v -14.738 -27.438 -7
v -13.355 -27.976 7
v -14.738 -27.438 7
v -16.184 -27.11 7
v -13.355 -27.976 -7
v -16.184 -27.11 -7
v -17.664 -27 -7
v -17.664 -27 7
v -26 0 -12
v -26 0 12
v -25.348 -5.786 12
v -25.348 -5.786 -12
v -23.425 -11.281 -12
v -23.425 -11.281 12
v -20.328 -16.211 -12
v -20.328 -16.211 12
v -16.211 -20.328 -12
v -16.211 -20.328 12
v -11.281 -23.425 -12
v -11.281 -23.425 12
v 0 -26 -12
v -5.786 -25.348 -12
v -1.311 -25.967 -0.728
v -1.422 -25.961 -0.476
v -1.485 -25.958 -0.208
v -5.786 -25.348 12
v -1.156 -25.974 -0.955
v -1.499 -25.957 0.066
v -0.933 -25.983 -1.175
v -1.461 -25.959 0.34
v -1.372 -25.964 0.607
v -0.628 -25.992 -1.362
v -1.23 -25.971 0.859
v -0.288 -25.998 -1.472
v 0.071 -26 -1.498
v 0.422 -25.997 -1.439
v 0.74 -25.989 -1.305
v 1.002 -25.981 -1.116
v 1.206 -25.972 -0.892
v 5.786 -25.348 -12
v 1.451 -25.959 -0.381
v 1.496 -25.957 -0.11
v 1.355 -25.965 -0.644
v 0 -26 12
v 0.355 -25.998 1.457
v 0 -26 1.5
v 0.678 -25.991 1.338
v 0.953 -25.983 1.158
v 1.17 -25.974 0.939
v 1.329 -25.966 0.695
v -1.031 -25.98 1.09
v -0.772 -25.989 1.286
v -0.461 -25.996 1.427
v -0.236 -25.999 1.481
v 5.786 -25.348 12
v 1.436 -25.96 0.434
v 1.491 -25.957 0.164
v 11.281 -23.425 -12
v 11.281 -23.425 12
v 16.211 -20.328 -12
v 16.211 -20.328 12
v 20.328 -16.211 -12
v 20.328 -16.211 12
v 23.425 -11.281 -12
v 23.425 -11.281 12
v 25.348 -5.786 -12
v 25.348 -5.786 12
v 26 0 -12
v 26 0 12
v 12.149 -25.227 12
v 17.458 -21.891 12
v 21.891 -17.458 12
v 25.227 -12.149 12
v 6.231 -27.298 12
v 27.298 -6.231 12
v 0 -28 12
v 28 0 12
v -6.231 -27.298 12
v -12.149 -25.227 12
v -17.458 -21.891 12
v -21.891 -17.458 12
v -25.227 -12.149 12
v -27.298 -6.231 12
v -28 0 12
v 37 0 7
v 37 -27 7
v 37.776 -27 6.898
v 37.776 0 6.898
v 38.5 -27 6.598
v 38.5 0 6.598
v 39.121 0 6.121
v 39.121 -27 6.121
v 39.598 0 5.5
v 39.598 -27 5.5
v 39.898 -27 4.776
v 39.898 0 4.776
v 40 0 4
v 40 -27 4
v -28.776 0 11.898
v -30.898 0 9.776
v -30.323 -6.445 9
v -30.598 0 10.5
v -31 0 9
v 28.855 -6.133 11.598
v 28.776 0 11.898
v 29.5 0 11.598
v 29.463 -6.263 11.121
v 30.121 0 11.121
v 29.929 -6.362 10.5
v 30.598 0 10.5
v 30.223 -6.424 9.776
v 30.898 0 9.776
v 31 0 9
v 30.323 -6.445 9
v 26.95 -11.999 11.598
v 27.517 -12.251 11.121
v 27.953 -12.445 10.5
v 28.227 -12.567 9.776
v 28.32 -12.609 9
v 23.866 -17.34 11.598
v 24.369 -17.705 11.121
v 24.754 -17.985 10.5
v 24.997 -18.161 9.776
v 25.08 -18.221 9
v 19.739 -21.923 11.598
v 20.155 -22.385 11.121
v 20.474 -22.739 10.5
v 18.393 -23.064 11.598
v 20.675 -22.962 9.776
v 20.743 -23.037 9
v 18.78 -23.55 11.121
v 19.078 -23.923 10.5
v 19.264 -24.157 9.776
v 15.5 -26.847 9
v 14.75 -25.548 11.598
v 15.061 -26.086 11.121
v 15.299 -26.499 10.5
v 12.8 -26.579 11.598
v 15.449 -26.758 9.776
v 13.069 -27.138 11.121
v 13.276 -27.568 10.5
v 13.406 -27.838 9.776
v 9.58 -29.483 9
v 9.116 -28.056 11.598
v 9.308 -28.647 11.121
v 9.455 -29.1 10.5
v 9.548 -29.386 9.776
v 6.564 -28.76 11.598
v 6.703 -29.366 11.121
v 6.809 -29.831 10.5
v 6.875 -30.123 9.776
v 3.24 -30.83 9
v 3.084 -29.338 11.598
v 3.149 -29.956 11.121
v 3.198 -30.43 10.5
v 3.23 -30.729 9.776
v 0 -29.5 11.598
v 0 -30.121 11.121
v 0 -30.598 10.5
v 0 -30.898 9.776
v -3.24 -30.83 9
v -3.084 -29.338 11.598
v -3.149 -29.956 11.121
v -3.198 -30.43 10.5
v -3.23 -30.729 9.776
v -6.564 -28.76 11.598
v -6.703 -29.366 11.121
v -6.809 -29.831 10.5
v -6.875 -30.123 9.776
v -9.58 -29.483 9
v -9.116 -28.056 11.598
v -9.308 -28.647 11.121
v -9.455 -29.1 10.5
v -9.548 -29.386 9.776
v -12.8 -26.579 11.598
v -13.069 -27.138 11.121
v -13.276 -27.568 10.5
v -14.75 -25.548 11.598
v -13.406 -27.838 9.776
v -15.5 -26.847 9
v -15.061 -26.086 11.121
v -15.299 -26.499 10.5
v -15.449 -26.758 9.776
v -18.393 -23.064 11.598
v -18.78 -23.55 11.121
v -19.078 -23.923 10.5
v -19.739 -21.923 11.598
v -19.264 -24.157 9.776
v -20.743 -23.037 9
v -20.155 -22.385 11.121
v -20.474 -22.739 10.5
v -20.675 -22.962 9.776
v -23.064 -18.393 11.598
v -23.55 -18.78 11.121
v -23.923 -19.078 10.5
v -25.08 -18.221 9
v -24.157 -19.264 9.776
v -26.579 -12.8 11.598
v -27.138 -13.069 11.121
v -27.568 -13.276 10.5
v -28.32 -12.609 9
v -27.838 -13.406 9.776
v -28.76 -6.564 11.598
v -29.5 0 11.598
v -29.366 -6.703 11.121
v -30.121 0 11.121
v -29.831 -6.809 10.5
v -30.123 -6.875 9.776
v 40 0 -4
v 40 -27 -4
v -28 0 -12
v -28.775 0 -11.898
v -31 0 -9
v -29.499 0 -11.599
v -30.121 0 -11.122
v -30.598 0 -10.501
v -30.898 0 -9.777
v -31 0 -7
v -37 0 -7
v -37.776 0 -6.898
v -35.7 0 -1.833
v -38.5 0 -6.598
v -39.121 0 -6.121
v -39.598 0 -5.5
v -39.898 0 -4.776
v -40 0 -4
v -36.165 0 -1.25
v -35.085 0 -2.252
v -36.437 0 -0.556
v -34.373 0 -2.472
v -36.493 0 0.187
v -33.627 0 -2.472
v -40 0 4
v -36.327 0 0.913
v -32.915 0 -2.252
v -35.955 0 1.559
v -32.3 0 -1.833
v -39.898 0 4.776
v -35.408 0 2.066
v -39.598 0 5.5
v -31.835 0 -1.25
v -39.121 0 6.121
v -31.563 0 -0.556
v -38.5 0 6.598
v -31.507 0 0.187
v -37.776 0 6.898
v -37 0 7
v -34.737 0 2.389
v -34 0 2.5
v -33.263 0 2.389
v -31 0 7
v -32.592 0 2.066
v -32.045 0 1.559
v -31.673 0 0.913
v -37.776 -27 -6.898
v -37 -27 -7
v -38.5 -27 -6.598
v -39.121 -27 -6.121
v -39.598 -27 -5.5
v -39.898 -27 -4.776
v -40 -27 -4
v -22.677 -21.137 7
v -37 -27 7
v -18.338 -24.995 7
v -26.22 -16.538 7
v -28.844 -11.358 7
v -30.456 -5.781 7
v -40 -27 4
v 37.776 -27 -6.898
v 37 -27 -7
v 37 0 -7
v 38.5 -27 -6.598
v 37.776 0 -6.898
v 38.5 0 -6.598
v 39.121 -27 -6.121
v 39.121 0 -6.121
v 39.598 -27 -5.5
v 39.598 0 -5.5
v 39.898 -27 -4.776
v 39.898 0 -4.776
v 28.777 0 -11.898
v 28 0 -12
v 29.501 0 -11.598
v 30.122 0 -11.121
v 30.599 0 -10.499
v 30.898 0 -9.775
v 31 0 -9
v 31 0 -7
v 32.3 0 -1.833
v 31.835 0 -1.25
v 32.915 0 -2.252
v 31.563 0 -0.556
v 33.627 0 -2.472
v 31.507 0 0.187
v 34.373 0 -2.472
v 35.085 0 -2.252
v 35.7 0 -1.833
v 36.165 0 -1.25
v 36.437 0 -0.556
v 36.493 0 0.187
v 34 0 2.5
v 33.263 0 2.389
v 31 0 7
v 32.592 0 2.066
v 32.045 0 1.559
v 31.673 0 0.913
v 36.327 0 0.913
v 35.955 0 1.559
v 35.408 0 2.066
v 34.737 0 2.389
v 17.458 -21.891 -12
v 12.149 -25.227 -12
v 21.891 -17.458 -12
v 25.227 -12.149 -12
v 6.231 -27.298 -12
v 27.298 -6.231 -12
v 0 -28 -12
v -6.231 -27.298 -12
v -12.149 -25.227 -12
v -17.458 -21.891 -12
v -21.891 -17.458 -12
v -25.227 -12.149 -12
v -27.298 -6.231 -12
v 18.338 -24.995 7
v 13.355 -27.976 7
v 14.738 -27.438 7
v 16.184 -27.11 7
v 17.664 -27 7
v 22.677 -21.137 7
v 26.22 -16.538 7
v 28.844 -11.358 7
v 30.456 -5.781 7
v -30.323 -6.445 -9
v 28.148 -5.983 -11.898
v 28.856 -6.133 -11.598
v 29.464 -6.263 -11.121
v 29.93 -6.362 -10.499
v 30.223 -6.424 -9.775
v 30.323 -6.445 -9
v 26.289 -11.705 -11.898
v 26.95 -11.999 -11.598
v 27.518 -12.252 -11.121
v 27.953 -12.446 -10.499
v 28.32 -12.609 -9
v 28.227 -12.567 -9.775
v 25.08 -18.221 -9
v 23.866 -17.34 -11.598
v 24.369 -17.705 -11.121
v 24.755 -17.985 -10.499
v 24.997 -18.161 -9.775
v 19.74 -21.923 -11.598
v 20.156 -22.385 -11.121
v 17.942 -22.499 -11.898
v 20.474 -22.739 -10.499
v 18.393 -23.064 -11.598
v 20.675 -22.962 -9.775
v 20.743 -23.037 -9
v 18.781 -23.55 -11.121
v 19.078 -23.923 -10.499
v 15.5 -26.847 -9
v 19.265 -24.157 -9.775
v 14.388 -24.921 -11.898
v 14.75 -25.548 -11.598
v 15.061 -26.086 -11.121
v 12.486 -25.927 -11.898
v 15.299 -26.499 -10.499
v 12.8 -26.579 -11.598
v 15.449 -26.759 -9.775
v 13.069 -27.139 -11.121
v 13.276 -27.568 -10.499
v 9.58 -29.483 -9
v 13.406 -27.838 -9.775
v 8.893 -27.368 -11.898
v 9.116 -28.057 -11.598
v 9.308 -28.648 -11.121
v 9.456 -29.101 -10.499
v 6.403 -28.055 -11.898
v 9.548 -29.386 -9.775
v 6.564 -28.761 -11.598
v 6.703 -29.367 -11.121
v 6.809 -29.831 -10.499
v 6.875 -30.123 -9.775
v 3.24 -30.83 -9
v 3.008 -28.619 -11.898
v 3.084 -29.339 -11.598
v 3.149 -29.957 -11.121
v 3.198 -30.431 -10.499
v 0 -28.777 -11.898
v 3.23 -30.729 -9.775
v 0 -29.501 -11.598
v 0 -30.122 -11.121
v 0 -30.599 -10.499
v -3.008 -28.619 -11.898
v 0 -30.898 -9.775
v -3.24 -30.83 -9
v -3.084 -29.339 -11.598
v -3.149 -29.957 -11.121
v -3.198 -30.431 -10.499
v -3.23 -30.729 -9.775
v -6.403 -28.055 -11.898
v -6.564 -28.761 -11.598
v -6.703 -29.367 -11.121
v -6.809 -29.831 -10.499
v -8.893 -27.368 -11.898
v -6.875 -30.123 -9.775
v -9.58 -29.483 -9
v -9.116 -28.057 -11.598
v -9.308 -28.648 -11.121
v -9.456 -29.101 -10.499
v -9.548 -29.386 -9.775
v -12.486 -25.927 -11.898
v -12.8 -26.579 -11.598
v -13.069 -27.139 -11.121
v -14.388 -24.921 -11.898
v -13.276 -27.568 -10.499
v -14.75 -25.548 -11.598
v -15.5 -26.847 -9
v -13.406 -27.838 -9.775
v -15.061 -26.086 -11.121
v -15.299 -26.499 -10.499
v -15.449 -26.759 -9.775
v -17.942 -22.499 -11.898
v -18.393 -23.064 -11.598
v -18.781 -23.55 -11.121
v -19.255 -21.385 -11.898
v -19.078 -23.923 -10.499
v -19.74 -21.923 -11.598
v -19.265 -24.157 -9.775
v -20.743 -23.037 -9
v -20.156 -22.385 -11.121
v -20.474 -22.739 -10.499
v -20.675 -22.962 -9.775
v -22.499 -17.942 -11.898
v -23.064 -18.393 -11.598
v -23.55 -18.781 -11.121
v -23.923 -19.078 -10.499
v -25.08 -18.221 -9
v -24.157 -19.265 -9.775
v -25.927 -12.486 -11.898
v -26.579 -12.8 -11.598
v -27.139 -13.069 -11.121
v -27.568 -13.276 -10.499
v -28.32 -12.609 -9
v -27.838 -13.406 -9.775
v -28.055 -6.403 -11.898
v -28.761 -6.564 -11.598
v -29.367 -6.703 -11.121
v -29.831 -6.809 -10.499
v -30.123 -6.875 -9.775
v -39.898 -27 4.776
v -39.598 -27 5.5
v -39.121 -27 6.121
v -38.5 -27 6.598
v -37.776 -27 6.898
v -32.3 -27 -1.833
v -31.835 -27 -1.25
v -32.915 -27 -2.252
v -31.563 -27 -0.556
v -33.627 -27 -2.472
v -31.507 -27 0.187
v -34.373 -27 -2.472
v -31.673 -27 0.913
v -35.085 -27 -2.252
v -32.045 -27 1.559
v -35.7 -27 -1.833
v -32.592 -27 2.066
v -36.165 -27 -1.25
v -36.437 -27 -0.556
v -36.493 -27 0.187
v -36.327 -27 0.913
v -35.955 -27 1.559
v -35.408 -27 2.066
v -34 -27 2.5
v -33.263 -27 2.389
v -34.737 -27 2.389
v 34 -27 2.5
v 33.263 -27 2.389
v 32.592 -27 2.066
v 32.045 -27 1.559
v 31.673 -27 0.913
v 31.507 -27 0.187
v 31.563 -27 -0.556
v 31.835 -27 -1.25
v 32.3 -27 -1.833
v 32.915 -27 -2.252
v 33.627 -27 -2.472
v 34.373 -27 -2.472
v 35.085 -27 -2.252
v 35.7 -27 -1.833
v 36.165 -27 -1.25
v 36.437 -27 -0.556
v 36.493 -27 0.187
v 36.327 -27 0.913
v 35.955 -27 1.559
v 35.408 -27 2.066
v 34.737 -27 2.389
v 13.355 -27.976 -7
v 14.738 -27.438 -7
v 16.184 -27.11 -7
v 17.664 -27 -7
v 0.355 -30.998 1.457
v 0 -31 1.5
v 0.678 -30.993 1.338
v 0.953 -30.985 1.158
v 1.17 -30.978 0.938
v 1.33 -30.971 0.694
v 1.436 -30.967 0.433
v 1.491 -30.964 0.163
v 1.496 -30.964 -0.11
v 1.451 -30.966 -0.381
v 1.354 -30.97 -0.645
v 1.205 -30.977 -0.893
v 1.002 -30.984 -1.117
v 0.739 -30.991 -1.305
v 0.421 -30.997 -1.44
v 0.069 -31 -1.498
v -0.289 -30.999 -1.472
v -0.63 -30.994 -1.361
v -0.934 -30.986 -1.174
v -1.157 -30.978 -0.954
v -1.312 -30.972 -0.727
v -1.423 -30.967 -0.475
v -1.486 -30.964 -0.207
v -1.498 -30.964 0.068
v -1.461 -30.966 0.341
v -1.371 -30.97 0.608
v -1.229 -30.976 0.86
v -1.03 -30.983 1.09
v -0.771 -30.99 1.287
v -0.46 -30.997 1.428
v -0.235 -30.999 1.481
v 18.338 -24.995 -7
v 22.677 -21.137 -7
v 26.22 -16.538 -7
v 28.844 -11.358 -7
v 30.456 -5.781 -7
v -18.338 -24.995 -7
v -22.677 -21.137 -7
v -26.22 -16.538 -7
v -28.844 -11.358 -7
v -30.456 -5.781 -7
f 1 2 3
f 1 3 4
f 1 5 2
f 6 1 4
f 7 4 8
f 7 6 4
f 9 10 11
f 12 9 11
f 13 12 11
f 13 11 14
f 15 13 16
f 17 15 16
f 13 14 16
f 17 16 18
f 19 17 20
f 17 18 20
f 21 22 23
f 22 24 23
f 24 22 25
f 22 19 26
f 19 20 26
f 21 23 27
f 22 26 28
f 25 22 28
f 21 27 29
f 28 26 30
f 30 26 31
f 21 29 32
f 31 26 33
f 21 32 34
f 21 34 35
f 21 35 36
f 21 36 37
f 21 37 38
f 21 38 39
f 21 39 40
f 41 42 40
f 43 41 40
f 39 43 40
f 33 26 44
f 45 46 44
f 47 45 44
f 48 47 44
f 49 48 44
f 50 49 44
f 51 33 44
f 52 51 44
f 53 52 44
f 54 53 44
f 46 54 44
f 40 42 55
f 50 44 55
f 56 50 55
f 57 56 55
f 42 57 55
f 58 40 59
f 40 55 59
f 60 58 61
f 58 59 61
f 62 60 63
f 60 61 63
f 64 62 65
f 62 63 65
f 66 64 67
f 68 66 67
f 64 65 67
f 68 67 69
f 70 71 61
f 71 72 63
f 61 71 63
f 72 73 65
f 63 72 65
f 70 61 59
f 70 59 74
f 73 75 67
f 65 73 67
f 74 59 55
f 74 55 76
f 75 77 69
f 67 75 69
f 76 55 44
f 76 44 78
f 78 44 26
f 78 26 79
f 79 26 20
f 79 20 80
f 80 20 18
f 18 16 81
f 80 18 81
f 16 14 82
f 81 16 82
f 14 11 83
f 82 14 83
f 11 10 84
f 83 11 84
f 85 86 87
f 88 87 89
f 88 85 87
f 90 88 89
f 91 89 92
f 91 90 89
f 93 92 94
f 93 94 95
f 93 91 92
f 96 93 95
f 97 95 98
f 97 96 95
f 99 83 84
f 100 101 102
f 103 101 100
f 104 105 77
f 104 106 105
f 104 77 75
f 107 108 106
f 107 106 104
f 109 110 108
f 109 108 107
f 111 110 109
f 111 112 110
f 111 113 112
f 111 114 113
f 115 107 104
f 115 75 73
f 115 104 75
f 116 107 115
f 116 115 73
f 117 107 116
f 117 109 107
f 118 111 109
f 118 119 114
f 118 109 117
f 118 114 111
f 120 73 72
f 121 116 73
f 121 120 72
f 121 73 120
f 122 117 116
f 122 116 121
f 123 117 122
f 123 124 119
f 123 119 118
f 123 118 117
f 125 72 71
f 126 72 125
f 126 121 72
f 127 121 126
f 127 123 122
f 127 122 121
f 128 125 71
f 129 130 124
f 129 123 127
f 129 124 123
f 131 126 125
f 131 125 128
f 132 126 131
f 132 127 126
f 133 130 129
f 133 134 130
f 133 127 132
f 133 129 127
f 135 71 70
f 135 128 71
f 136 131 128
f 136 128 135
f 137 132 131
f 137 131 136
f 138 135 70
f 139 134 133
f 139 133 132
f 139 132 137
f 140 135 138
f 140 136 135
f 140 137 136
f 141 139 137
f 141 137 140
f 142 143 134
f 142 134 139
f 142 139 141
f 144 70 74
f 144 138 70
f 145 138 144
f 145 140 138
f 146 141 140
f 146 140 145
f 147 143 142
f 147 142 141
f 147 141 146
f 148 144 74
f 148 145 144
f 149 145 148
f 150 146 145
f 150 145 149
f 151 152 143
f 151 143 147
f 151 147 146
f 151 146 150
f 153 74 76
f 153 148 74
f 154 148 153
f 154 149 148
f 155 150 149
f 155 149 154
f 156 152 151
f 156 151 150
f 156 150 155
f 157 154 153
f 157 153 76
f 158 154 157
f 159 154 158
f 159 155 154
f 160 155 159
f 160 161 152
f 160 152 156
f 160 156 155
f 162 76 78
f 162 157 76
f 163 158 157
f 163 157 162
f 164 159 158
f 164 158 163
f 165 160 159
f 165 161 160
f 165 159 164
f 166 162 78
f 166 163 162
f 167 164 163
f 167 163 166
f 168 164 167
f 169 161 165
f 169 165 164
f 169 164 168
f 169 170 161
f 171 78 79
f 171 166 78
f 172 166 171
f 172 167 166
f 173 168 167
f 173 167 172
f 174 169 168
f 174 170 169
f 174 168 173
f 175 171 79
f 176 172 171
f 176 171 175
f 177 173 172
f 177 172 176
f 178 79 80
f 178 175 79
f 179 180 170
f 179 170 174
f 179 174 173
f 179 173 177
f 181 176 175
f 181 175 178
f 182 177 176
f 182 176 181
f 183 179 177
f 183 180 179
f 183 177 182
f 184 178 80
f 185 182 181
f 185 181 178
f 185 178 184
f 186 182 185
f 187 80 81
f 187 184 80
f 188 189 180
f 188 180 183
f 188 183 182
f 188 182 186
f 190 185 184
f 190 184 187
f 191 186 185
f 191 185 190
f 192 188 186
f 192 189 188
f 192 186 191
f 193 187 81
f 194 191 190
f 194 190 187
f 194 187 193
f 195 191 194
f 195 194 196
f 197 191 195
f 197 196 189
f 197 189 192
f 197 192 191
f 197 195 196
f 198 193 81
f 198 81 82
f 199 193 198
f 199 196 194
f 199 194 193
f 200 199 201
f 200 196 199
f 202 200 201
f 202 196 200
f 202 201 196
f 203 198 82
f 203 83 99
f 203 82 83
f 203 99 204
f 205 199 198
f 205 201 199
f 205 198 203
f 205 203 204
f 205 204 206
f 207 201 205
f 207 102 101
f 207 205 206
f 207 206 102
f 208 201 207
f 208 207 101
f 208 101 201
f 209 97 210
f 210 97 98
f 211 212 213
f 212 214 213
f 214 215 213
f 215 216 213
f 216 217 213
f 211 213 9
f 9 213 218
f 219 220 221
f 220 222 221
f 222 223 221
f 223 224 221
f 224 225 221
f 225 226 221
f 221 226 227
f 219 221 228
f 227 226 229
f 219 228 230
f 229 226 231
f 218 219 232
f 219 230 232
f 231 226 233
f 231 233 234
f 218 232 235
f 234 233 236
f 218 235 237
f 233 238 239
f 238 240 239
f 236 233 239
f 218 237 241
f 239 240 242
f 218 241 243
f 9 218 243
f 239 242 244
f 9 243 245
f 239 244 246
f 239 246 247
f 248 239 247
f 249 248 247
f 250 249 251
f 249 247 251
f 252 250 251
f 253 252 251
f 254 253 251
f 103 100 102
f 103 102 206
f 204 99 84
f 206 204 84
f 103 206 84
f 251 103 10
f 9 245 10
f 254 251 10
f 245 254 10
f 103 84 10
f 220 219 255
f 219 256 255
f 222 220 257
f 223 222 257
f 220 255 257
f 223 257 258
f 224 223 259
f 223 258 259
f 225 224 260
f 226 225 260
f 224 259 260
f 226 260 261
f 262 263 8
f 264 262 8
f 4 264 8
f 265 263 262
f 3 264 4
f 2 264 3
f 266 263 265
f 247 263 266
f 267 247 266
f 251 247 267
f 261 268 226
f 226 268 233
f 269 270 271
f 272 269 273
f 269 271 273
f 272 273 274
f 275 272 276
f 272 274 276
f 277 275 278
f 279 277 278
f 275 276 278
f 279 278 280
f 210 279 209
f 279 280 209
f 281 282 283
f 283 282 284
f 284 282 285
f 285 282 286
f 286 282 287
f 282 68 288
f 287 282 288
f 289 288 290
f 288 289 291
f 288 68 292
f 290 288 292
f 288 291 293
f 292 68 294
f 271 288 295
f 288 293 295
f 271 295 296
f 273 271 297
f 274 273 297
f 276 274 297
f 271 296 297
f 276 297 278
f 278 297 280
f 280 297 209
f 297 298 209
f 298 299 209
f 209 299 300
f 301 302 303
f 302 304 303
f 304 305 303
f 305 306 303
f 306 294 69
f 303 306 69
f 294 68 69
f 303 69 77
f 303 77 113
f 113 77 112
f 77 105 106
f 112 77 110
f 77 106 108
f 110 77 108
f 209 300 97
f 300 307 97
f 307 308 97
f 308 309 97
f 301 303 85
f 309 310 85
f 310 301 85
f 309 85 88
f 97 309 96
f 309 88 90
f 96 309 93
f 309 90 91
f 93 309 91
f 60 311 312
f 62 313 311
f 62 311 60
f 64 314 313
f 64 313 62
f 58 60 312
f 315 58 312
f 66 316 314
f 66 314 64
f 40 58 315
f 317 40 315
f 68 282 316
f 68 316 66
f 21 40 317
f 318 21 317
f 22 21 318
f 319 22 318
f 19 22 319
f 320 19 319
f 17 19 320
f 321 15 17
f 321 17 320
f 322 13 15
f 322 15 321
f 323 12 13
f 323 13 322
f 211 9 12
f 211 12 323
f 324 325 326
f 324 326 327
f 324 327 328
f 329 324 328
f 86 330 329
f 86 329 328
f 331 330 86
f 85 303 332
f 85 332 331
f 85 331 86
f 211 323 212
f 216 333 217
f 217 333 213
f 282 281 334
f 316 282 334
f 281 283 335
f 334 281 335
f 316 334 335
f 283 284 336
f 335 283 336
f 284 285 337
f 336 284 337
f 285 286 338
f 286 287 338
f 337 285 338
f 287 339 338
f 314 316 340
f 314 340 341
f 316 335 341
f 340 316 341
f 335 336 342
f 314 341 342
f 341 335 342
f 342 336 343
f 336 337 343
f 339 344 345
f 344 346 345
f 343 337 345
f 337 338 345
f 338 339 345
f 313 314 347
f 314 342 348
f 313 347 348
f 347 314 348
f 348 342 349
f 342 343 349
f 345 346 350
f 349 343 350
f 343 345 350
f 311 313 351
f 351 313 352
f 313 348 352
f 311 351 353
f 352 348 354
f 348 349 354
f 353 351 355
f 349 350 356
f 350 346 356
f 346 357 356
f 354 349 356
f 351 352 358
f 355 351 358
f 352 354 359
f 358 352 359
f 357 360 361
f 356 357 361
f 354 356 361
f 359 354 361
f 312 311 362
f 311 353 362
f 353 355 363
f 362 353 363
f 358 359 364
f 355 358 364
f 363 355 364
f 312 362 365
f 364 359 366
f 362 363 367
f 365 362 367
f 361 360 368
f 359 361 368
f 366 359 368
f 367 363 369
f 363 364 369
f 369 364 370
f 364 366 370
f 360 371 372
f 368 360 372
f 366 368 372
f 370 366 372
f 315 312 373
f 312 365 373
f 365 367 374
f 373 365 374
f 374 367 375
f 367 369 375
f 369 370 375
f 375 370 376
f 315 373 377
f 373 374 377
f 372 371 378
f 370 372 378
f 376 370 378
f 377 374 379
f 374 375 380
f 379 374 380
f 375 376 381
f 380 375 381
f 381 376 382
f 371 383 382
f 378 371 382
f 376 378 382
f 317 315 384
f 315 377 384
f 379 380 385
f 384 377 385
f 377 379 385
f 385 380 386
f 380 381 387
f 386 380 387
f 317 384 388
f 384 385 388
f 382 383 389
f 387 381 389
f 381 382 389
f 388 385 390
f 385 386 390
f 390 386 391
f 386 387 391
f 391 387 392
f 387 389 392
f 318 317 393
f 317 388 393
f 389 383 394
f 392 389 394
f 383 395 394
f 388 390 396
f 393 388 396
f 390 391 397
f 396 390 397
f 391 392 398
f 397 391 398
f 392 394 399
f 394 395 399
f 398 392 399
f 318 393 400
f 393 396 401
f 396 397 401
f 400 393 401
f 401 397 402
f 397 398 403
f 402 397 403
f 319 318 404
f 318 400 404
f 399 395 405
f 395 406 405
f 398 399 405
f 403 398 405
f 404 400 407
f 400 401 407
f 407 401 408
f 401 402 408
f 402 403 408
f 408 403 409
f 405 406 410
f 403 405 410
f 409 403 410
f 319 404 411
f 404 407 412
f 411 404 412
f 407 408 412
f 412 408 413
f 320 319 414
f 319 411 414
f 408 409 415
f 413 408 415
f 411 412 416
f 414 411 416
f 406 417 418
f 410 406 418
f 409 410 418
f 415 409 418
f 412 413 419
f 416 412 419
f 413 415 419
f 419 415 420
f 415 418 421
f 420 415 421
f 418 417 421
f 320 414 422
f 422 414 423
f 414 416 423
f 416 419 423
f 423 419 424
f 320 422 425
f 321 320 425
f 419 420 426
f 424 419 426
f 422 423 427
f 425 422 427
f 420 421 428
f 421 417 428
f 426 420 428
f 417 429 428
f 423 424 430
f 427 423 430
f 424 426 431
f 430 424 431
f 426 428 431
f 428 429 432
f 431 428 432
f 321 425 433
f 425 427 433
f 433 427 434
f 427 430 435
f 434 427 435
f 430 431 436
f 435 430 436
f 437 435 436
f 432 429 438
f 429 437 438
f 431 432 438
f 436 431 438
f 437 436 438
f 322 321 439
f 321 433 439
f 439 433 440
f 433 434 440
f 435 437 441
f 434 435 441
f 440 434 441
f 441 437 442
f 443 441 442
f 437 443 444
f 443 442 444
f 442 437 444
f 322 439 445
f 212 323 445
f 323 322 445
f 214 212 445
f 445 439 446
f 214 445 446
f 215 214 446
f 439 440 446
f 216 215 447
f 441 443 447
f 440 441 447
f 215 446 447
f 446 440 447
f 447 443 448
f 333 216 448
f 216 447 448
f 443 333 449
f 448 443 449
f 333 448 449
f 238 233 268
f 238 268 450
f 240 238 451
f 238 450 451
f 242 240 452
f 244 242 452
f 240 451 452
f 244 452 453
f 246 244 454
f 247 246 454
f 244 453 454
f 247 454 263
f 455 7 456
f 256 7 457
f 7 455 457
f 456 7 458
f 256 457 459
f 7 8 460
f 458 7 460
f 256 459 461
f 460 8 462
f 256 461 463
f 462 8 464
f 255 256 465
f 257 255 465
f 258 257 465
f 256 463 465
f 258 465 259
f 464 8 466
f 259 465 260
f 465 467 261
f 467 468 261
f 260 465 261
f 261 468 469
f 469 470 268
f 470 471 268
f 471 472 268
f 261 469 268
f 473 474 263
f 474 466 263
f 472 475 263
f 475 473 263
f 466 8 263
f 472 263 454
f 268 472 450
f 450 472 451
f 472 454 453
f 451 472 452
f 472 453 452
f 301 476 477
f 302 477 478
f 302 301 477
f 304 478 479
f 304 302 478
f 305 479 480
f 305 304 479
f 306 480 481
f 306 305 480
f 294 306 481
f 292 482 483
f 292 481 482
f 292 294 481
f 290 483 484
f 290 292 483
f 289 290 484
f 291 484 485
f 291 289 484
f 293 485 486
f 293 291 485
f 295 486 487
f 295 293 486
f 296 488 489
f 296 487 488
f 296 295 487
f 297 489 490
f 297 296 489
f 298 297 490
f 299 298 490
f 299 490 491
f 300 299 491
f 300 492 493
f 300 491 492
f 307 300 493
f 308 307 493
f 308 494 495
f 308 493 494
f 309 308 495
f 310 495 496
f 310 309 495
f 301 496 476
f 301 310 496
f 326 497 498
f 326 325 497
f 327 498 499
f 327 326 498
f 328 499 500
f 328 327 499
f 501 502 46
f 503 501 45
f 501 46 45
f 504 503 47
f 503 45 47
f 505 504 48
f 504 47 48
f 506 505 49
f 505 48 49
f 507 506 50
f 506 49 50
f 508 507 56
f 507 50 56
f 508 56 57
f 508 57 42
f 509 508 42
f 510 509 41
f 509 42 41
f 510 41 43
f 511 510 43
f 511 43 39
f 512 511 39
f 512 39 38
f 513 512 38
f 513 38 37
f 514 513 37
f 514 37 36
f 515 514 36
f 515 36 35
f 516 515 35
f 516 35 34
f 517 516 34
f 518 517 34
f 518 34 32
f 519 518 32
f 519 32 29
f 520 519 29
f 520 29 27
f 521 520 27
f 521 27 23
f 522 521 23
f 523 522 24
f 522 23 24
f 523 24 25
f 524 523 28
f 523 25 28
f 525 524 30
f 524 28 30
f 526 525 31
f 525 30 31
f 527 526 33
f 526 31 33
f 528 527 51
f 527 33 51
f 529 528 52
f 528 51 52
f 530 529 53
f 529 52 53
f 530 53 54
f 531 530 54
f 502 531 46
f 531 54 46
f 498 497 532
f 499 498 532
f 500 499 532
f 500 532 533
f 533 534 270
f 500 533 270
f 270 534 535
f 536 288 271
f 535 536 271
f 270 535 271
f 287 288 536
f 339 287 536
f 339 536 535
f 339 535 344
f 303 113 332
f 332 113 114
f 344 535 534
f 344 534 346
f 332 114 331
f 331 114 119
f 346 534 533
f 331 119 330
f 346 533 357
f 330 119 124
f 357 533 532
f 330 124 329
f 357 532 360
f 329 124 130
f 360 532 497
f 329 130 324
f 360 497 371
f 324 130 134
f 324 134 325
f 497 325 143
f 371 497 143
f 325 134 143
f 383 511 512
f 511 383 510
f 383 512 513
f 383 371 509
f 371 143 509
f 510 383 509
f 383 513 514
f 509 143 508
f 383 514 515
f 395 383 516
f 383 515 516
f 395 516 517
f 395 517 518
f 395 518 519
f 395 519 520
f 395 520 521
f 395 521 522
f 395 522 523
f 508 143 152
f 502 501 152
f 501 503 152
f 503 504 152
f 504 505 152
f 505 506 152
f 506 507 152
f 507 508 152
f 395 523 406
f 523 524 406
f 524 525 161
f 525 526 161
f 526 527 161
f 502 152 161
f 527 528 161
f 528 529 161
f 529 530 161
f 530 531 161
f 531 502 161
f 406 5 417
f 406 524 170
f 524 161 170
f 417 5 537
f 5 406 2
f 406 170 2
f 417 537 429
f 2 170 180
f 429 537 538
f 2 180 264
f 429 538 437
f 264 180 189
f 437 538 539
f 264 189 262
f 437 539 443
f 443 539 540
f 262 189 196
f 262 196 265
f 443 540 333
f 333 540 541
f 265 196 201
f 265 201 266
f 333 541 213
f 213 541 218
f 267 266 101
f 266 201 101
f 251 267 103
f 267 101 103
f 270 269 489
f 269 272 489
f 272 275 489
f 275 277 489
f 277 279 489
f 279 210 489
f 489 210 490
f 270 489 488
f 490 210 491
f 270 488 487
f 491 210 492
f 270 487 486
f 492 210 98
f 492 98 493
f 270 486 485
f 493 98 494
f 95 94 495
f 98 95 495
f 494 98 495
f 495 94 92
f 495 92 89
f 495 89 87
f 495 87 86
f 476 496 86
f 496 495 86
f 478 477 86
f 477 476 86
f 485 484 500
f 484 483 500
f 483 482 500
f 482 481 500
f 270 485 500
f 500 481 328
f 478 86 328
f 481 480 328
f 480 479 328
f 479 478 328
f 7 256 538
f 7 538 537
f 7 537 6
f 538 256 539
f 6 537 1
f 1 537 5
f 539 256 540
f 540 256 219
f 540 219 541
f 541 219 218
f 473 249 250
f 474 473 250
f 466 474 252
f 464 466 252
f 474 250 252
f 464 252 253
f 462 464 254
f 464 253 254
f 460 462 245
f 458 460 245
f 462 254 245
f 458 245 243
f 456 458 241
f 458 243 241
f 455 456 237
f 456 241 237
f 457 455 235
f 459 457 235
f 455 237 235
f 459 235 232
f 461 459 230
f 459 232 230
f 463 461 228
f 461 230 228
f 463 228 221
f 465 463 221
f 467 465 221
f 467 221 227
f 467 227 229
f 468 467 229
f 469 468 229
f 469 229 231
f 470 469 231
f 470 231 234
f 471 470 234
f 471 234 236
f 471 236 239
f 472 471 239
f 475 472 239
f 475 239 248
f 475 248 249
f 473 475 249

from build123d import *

# Parameters (mm, degrees)
EXTRUDE_1_DEPTH     = 12
CUT_EXTRUDE_START   = -5
CUT_EXTRUDE_1_DEPTH = 5
FILLET_1_R          = 3
SKETCH_3_R          = 2.500000000000002
CUT_EXTRUDE_2_DEPTH = 53.009614555387756
SKETCH_4_R          = 1.5
CUT_EXTRUDE_3_DEPTH = 53.009614555387756
FILLET_2_R          = 10


with BuildPart() as part:
    # 草图1 → 拉伸1 (new body)
    with BuildSketch(Plane.XY):
        with BuildLine():
            Line((26.000000000000004, 0), (40.00000000000001, 0))
            Line((40.00000000000001, 0), (40.000000000000014, -27))
            Line((40.000000000000014, -27), (15.231546211727823, -26.99999999999999))
            ThreePointArc((15.231546211727823, -26.99999999999999), (8.78e-15, -31), (-15.231546211727816, -27))
            Line((-15.231546211727816, -27), (-39.999999999999986, -27))
            Line((-39.999999999999986, -27), (-39.99999999999999, 0))
            Line((-39.99999999999999, 0), (-26.000000000000004, 0))
            ThreePointArc((-26.000000000000004, 0), (-4.78e-15, -26.000000000000004), (26.000000000000004, 0))
        make_face()
    extrude(amount=EXTRUDE_1_DEPTH)

    # 草图2 → 切除-拉伸1 (cut)
    with BuildSketch(Plane.XY.offset(12).offset(CUT_EXTRUDE_START)):
        with BuildLine():
            Line((-39.999999999999986, -27), (-15.231546211727814, -26.999999999999996))
            ThreePointArc((-15.231546211727814, -26.999999999999996), (-26.769179409944208, -15.633650684284165), (-30.999999999999993, 0))
            Line((-30.999999999999993, 0), (-39.99999999999999, 0))
            Line((-39.99999999999999, 0), (-39.999999999999986, -27))
        make_face()
        with BuildLine():
            Line((40.00000000000001, 0), (30.999999999999993, 0))
            ThreePointArc((30.999999999999993, 0), (26.769179409944208, -15.633650684284161), (15.231546211727823, -26.99999999999999))
            Line((15.231546211727823, -26.99999999999999), (40.000000000000014, -27))
            Line((40.000000000000014, -27), (40.00000000000001, 0))
        make_face()
    extrude(amount=CUT_EXTRUDE_1_DEPTH, mode=Mode.SUBTRACT)

    # 镜向1: part across plane


with BuildPart() as part_1:
    add(part.part)
    add(part.part.mirror(Plane.XY))

    # 圆角1
    fillet_1_edges = [part_1.edges().sort_by_distance(p)[0] for p in [
        (3.232e-14, -30.99999999999998, 12),
        (-39.999999999999986, -13.5, 7),
        (40.000000000000014, -13.5, 7),
        (40.000000000000014, -13.5, -7),
        (-39.999999999999986, -13.5, -7),
        (3.232e-14, -30.99999999999998, -12),
    ]]
    fillet(fillet_1_edges, radius=FILLET_1_R)

    # 草图3 → 切除-拉伸2 (cut, through all)
    with BuildSketch(Plane(origin=(0, 0, 0), x_dir=(1, 0, 0), z_dir=(0, 1, 0))):
        with Locations(Location((-33.99999999999999, 0, 0), (0, 0, 270))):
            Circle(SKETCH_3_R)
    cut_extrude_2 = extrude(amount=-CUT_EXTRUDE_2_DEPTH, mode=Mode.SUBTRACT)

    # 镜向2: 切除-拉伸2 across plane
    add(cut_extrude_2.mirror(Plane(origin=(0, 0, 0), x_dir=(0, 0, 1), z_dir=(1, 0, 0))), mode=Mode.SUBTRACT)

    # 草图4 → 切除-拉伸3 (cut, through all)
    with BuildSketch(Plane(origin=(0, 0, 0), x_dir=(1, 0, 0), z_dir=(0, 1, 0))):
        with Locations(Location((0, 0, 0), (0, 0, 270))):
            Circle(SKETCH_4_R)
    extrude(amount=-CUT_EXTRUDE_3_DEPTH, mode=Mode.SUBTRACT)

    # 圆角2
    fillet_2_edges = [part_1.edges().sort_by_distance(p)[0] for p in [
        (-15.231546211727814, -26.999999999999996, 0),
        (15.23154621172782, -26.999999999999986, 0),
    ]]
    fillet(fillet_2_edges, radius=FILLET_2_R)


solid = part_1.part
